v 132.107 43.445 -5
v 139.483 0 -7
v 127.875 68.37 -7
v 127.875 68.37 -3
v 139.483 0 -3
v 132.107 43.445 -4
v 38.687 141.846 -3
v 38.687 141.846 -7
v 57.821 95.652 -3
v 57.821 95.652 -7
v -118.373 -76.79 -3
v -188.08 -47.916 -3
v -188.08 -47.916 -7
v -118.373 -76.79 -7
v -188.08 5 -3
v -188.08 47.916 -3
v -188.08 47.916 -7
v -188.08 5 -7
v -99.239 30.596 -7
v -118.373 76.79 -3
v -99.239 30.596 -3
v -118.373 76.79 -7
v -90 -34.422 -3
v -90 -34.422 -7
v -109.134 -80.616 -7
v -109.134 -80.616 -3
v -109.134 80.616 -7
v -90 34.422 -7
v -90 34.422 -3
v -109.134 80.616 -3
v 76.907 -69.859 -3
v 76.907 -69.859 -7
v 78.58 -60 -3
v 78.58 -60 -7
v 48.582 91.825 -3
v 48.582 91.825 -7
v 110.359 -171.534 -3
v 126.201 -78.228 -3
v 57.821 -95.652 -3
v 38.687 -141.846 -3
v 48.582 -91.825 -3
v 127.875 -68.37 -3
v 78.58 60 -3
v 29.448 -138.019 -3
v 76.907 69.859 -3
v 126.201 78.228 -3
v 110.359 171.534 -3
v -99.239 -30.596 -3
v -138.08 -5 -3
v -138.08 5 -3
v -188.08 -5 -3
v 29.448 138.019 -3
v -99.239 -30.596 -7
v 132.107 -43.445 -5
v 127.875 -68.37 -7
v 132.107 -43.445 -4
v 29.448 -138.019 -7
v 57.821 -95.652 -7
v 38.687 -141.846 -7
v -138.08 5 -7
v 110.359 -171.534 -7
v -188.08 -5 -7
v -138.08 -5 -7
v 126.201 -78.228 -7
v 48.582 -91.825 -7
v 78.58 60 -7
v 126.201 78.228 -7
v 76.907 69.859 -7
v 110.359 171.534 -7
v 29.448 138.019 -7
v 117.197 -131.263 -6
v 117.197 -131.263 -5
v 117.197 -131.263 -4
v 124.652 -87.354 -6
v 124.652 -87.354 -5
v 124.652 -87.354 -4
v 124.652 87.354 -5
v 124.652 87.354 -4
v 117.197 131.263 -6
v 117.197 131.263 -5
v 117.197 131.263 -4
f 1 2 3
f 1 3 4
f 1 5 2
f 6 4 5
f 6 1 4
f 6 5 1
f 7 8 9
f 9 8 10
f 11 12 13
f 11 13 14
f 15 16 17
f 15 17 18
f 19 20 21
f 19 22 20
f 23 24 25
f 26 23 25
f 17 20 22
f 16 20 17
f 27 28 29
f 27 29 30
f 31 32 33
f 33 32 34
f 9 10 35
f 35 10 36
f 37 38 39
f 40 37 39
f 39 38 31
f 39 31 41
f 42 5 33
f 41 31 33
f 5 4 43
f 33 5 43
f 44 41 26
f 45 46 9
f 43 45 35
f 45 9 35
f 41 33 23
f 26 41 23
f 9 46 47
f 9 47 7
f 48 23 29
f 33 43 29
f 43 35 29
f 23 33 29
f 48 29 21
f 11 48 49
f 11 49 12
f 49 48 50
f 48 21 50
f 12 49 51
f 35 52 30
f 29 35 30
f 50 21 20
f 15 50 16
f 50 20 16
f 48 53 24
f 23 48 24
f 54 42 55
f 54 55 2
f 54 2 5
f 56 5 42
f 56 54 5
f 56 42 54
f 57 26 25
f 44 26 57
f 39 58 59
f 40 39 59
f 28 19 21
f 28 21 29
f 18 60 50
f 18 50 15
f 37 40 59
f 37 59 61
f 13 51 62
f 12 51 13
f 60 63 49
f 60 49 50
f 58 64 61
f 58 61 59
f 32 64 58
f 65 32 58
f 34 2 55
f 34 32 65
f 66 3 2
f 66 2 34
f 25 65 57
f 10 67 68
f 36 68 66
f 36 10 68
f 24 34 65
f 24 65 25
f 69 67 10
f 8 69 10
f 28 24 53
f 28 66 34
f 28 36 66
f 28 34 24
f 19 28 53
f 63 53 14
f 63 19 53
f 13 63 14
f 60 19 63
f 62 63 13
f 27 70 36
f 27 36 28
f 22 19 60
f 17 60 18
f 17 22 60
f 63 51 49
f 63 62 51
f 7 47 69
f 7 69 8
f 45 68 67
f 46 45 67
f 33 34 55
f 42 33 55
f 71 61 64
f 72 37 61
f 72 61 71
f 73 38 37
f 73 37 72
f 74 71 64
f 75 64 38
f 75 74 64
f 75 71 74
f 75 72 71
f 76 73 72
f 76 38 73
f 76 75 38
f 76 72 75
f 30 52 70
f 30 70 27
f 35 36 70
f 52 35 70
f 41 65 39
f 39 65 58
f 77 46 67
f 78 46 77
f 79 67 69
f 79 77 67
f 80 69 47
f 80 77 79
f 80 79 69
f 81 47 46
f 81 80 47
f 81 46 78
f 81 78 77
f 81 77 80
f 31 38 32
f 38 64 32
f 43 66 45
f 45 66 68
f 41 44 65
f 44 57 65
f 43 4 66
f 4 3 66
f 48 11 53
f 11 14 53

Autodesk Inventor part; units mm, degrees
ref_plane "YZ Plane" through (0, 0, 0) normal (1, 0, 0) x (0, 1, 0)
ref_plane "XZ Plane" through (0, 0, 0) normal (0, 1, 0) x (-1, 0, 0)
ref_plane "Work Plane1" through (0, 0, -3) normal (0, 0, -1) x (-1, 0, 0)
sketch "Sketch1" plane through (0, 0, -3) normal (0, 0, -1) x (-1, 0, 0)
  line L0 (188.08, 47.916) -> (188.08, -47.916) projected
  line L1 (-110.3592, 171.5336) -> (188.08, 47.916) projected
  spline S0 degree 3 poles (-139.4832, 0) (-137.0244, 14.4817) (-134.5656, 28.9634) (-129.6218, 58.0812) (-127.1368, 72.7174) (-124.6518, 87.3535) (-122.1668, 101.99) (-119.6817, 116.6264) (-114.9175, 144.6864) (-112.6384, 158.11) (-110.3592, 171.5336) knots 0.047 0.047 0.047 0.047 4.453683 4.453683 8.907367 8.907367 8.907367 13.361137 13.361137 17.44584 17.44584 17.44584 17.44584 projected
  spline S1 degree 3 poles (-110.3592, -171.5336) (-112.6384, -158.11) (-114.9175, -144.6864) (-119.6817, -116.6264) (-122.1668, -101.99) (-124.6518, -87.3535) (-127.1368, -72.7174) (-129.6218, -58.0812) (-134.5656, -28.9634) (-137.0244, -14.4817) (-139.4832, 0) knots 0.369067 0.369067 0.369067 0.369067 4.45377 4.45377 8.90754 8.90754 8.90754 13.361224 13.361224 17.767907 17.767907 17.767907 17.767907 projected
  line L2 (188.08, -47.916) -> (-110.3592, -171.5336) projected
  point P0 (0, 0)
extrude "Extrusion1" add sketch "Sketch1" along normal blind 4
sketch "Sketch2" plane through (0, 0, -7) normal (0, 0, -1) x (-1, 0, 0)
  line L0 (188.08, -47.916) -> (188.08, 47.916) construction
  line L1 (188.08, 47.916) -> (-110.3592, 171.5336) construction
  line L2 (-110.3592, -171.5336) -> (188.08, -47.916) construction
  line L3 (138.08, 5) -> (188.08, 5)
  line L4 (188.08, 5) -> (188.08, -5)
  line L5 (188.08, -5) -> (138.08, -5)
  line L6 (138.08, -5) -> (138.08, 5)
  line L7 (99.2388, -30.5956) -> (90, -34.4224)
  line L8 (90, -34.4224) -> (109.1342, -80.6164)
  line L9 (109.1342, -80.6164) -> (118.373, -76.7896)
  line L10 (118.373, -76.7896) -> (99.2388, -30.5956)
  line L11 (-48.5819, -91.8249) -> (-57.8207, -95.6518)
  line L12 (-57.8207, -95.6518) -> (-38.6866, -141.8457)
  line L13 (-38.6866, -141.8457) -> (-29.4478, -138.0189)
  line L14 (-29.4478, -138.0189) -> (-48.5819, -91.8249)
  line L15 (-78.5805, -60) -> (-127.875, -68.3695)
  line L16 (-127.875, -68.3695) -> (-126.2011, -78.2284)
  line L17 (-126.2011, -78.2284) -> (-76.9066, -69.8589)
  line L18 (-76.9066, -69.8589) -> (-78.5805, -60)
  line L19 (-76.9066, 69.8589) -> (-126.2011, 78.2284)
  line L20 (-126.2011, 78.2284) -> (-127.875, 68.3695)
  line L21 (-127.875, 68.3695) -> (-78.5805, 60)
  line L22 (-78.5805, 60) -> (-76.9066, 69.8589)
  line L23 (109.1342, 80.6164) -> (118.373, 76.7896)
  line L24 (118.373, 76.7896) -> (99.2388, 30.5956)
  line L25 (99.2388, 30.5956) -> (90, 34.4224)
  line L26 (90, 34.4224) -> (109.1342, 80.6164)
  line L27 (188.08, -47.916) -> (188.08, 47.916) projected
  line L28 (-110.3592, -171.5336) -> (188.08, -47.916) projected
  line L29 (188.08, 47.916) -> (-110.3592, 171.5336) projected
  line L30 (-29.4478, 138.0189) -> (-38.6866, 141.8457)
  line L31 (-38.6866, 141.8457) -> (-57.8207, 95.6518)
  line L32 (-57.8207, 95.6518) -> (-48.5819, 91.8249)
  line L33 (-48.5819, 91.8249) -> (-29.4478, 138.0189)
  point P0 (0, 0)
  point P1 (-139.4832, 0)
  point P2 (188.08, 0)
  dimension "d2" = 10
  dimension "d3" = 10
  dimension "d5" = 10
  dimension "d6" = 10
  dimension "d7" = 10
  dimension "d8" = 10
  dimension "d10" = 50
  dimension "d11" = 50
  dimension "d12" = 50
  dimension "d13" = 50
  dimension "d14" = 50
  dimension "d15" = 50
  dimension "d18" = 150
  dimension "d19" = 60
  dimension "d20" = 60
  dimension "d21" = 90
  dimension "d22" = 90
  dimension "d23" = 10
  dimension "d24" = 50
  dimension "d25" = 150
extrude "Extrusion2" cut sketch "Sketch2" against normal through all
properties part number "internalSupportBottom2" material "Wood (Cherry)"
